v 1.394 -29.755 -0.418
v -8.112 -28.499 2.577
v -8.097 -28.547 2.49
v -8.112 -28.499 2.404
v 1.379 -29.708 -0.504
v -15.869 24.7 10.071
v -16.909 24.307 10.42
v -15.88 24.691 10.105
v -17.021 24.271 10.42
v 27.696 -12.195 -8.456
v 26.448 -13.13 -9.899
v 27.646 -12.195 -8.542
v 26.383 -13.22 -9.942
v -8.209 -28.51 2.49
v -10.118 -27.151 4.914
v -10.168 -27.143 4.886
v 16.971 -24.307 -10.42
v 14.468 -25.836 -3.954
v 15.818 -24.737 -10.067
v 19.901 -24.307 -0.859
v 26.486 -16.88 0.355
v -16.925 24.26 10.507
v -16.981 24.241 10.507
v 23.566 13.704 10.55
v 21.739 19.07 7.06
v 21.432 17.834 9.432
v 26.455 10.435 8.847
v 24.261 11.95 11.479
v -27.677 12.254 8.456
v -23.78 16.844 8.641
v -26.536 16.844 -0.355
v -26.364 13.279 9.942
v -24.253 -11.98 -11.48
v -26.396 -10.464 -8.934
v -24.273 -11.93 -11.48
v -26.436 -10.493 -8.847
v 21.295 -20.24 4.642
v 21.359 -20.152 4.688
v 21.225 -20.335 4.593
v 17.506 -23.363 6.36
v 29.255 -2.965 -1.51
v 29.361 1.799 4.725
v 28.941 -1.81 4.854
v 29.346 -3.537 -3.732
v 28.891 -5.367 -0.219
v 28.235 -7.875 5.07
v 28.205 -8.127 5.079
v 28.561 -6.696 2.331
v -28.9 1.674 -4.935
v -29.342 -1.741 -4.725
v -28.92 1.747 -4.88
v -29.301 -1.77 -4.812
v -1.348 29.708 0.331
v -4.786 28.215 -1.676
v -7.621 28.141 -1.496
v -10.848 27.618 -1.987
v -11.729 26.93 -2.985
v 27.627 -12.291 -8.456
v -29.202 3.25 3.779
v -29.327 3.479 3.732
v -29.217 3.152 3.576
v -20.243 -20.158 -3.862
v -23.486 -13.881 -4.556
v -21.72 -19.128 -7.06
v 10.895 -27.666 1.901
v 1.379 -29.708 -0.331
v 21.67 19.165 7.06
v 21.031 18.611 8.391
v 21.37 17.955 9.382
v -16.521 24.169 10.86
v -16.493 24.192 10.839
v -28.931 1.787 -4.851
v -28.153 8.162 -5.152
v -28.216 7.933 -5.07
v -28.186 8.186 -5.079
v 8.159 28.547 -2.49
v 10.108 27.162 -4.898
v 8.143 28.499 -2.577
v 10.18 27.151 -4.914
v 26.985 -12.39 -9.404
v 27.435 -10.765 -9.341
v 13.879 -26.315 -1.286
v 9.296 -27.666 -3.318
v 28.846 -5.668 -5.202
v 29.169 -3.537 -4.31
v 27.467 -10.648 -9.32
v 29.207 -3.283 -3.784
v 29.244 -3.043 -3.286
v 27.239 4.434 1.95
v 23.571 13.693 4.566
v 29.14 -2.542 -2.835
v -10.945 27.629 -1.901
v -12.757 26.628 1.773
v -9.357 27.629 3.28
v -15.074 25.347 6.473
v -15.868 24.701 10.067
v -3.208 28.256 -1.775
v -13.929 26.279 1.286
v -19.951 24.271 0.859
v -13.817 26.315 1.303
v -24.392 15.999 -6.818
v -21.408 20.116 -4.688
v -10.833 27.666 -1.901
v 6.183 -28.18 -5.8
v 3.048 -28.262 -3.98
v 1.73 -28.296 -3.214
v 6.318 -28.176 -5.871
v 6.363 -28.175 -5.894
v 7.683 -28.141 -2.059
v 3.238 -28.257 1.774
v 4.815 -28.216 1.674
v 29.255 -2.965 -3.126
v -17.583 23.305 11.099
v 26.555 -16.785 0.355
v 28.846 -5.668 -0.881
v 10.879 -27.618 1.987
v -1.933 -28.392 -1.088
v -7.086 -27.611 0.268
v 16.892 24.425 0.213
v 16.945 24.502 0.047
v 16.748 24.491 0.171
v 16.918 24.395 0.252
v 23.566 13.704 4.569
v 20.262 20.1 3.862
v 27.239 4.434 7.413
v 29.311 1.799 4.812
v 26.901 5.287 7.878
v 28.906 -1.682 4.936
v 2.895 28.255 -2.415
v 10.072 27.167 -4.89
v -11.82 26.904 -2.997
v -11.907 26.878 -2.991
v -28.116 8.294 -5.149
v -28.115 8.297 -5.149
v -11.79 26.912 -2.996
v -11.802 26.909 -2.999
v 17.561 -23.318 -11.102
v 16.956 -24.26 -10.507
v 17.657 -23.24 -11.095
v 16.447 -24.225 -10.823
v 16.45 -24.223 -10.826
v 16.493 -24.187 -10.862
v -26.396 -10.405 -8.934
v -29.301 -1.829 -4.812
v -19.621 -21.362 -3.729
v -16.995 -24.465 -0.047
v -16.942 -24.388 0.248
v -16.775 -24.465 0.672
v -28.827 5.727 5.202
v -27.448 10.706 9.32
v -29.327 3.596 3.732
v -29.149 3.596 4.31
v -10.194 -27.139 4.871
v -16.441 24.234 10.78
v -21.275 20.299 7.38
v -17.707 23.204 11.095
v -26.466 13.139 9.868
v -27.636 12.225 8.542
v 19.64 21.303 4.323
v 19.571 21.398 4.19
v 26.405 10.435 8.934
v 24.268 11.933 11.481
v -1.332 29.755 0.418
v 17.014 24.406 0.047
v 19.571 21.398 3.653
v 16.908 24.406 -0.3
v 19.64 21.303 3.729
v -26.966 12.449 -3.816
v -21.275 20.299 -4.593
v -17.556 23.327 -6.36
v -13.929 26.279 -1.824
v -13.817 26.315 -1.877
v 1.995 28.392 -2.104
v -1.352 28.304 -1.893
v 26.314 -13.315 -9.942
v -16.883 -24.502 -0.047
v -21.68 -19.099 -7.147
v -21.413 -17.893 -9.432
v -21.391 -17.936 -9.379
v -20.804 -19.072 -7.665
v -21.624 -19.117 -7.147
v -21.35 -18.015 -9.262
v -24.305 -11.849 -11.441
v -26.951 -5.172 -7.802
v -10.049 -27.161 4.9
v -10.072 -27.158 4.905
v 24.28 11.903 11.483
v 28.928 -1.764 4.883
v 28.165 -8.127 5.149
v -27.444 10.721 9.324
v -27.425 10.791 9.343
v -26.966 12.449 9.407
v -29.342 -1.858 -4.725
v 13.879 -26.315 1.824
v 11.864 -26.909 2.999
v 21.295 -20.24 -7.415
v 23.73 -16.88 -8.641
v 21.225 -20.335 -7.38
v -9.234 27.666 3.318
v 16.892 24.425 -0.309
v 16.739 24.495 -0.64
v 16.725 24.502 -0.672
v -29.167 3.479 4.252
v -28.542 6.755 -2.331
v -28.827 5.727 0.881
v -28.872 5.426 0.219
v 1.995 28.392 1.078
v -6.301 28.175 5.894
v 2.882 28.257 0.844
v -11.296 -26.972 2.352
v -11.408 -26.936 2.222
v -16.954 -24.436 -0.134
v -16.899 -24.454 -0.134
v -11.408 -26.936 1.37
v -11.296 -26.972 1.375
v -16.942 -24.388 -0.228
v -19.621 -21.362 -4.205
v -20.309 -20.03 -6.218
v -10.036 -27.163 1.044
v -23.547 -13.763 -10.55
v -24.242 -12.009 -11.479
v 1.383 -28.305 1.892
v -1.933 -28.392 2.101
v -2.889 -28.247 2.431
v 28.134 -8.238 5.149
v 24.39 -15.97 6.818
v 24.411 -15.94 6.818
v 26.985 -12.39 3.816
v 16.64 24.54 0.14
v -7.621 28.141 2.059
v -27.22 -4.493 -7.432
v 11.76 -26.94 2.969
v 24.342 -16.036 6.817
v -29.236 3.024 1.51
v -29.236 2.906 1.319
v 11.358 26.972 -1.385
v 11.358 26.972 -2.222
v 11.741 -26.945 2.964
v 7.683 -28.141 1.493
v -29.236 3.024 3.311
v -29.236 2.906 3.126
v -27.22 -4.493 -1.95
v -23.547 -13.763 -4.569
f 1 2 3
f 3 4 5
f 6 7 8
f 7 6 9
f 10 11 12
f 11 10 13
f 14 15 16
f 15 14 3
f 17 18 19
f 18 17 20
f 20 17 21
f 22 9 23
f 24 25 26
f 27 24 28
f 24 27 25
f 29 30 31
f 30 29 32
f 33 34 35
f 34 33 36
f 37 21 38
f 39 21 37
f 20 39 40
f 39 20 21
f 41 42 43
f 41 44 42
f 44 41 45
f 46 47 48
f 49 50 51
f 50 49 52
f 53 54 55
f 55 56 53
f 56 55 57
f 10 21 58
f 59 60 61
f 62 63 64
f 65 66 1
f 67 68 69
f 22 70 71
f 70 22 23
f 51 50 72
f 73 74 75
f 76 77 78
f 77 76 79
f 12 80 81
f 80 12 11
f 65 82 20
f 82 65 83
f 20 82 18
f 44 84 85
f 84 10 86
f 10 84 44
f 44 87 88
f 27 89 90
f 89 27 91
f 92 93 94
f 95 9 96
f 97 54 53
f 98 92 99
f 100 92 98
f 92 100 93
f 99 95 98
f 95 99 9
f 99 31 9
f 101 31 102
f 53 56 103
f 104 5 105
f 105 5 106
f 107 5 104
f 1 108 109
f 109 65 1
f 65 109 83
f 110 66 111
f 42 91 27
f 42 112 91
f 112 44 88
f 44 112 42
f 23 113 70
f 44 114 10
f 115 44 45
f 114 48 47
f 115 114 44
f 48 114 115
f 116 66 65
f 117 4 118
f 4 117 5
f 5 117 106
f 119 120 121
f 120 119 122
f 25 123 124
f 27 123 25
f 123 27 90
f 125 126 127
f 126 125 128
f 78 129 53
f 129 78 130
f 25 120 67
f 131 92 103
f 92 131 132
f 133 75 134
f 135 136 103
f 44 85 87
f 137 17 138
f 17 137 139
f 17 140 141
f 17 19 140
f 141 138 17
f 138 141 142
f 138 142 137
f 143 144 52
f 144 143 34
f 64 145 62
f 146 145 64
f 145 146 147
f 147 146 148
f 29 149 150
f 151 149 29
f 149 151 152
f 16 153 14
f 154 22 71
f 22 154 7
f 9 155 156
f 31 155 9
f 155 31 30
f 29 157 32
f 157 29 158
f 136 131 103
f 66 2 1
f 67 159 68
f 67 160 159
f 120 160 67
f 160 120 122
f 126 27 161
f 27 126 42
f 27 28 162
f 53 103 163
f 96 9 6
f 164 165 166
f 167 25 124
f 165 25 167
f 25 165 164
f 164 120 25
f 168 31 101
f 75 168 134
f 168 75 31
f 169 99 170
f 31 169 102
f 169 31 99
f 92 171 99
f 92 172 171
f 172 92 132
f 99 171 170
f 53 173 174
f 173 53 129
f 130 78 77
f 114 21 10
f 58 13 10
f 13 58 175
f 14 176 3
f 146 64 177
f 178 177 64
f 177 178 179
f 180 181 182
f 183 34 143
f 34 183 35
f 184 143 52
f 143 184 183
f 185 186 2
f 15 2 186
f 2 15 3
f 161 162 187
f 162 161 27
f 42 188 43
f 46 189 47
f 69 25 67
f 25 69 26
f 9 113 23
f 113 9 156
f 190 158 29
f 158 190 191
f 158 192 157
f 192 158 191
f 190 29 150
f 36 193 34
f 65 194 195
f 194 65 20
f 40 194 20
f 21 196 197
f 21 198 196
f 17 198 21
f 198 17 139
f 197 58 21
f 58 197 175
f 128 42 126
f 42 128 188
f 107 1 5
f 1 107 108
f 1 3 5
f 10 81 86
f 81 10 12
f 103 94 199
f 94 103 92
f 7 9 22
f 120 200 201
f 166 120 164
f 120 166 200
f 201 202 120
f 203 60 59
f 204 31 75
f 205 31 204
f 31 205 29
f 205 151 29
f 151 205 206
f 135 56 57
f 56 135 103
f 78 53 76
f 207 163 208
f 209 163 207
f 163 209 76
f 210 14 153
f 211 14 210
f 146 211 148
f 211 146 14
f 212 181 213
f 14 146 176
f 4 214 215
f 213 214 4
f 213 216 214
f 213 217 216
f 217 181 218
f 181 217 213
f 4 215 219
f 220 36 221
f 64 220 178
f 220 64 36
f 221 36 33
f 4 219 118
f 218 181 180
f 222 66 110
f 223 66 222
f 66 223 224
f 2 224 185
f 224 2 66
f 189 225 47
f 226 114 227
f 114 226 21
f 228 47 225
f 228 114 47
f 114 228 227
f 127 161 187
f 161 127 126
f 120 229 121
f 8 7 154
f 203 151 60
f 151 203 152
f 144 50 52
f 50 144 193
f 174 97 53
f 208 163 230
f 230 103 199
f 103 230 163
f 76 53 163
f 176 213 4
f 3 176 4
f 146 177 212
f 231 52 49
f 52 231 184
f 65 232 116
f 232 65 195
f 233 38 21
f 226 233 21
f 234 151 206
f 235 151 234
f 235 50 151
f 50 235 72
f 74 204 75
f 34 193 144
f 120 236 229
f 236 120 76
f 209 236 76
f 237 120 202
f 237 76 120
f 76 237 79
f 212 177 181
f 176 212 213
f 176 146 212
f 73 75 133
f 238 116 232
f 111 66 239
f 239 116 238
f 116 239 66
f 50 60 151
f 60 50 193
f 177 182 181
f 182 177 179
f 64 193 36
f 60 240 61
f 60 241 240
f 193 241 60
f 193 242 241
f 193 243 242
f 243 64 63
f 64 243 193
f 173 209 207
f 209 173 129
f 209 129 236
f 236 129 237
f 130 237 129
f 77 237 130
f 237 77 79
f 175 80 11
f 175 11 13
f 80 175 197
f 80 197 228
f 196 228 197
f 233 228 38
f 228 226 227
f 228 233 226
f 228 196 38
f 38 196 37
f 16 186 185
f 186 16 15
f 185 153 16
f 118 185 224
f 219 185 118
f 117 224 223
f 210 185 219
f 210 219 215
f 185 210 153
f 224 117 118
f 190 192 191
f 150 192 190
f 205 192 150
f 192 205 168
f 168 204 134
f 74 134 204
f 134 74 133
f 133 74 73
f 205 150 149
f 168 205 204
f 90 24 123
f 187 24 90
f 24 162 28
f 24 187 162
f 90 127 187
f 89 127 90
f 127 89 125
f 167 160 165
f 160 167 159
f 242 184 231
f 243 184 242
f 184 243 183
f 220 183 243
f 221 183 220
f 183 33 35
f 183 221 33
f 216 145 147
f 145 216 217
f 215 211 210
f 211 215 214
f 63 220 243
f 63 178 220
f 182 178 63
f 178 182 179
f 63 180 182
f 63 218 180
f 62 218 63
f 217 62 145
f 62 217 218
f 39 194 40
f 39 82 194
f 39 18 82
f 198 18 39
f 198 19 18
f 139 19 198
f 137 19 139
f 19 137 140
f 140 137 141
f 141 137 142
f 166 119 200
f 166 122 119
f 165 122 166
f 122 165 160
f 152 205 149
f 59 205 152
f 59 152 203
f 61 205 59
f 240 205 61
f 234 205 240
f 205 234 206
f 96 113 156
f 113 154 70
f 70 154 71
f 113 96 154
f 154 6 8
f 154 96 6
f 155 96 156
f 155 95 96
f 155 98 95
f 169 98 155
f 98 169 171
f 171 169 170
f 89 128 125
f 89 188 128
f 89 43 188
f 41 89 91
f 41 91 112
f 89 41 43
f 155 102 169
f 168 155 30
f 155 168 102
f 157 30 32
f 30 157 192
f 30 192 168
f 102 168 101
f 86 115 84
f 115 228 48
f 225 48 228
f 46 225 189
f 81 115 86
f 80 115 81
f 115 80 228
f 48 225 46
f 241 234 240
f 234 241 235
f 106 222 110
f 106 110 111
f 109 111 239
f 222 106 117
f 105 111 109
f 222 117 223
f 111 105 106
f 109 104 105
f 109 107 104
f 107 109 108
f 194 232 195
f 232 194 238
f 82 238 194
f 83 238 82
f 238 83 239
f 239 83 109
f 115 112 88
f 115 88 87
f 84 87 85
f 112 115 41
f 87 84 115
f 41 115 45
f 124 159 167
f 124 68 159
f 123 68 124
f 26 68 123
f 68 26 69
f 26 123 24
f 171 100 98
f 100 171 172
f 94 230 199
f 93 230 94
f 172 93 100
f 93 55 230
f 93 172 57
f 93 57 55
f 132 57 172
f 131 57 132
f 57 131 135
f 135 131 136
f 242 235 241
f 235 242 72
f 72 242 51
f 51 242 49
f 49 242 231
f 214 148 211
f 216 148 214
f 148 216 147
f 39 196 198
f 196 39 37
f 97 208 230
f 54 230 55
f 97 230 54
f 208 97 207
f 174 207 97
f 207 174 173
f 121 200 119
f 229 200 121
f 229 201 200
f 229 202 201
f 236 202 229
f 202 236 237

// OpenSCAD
// Auto-generated OpenSCAD file

    inner_points = 10*[[-1.6451036775652808, -2.1626836934703126, -1.1975226886664396], [1.686072709471346, 2.432955782684813, 0.2356107715886286], [-1.6860727094713472, -2.4329557826848114, -0.2356107715886286], [1.6451036775652794, 2.1626836934703144, 1.1975226886664396], [-2.6884846067758437, 1.2389917062429145, 0.233618340039301], [-2.1194517463573437, 2.0240206487946675, 0.47842676129971456], [2.119451746357343, -2.0240206487946657, -0.47842676129971456], [2.6884846067758428, -1.2389917062429128, -0.233618340039301], [-0.2907283441631142, 1.0697947112799653, -2.7547493104508978], [-0.5305652343997654, -0.5124056576130412, 2.8763811346733195], [0.5305652343997641, 0.5124056576130432, -2.8763811346733195], [0.2907283441631129, -1.0697947112799635, 2.7547493104508978], [-1.8467649995645183, -1.4227471690324143, -1.839259902027394], [1.1327297390179003, 2.68771773847334, -0.5574263668434638], [-1.95402331758078, -2.130328684806416, 0.6790581910658857], [1.0254714210016385, 1.9801362226993382, 1.9608917262498158], [-1.0254714210016398, -1.9801362226993364, -1.9608917262498158], [1.9540233175807786, 2.130328684806418, -0.6790581910658857], [-1.1327297390179016, -2.687717738473338, 0.5574263668434638], [1.846764999564517, 1.422747169032416, 1.839259902027394], [-2.87456367211222, 0.5667833051879534, -0.4829780924069351], [-1.3848163028210105, 2.6220157589408304, 0.15793867518503008], [-2.915532704018286, 0.2965112159734543, 0.47893382467087603], [-1.425785334727077, 2.351743669726331, 1.1198505922628412], [1.4257853347270757, -2.3517436697263294, -1.1198505922628412], [2.9155327040182852, -0.2965112159734523, -0.47893382467087603], [1.3848163028210092, -2.6220157589408286, -0.15793867518503008], [2.874563672112219, -0.5667833051879514, 0.4829780924069351], [-1.2523453639028133, 1.0446987882266965, -2.48150417875951], [-0.6833125034843128, 1.8297277307784492, -2.2366957574990964], [-1.4668619999353363, -0.3704642433213059, 2.5551320074270496], [-0.8978291395168357, 0.4145646992304467, 2.799940428687463], [0.8978291395168344, -0.4145646992304447, -2.799940428687463], [1.466861999935335, 0.3704642433213079, -2.5551320074270496], [0.6833125034843115, -1.8297277307784474, 2.2366957574990964], [1.252345363902812, -1.0446987882266947, 2.48150417875951], [-2.214028904681588, -0.49577681218892655, -1.9157006080132506], [0.1964329734823296, 2.829659152765075, -0.8786754940897339], [-2.3466074769019785, -1.370395665307932, 1.197111744017687], [0.06385440126193956, 1.9550402996460696, 2.2341368579412038], [-0.06385440126194084, -1.9550402996460678, -2.2341368579412038], [2.3466074769019776, 1.3703956653079339, -1.197111744017687], [-0.19643297348233088, -2.8296591527650734, 0.8786754940897339], [2.2140289046815873, 0.49577681218892855, 1.9157006080132506], [-2.606613064002787, 0.2641562073095579, -1.3976470550614495], [-0.7651840462573698, 2.8045632297118064, -0.6054303623983461], [-2.7138713820190485, -0.44342530846444383, 1.1206710380318305], [-0.8724423642736312, 2.096981713937805, 1.9128877306949337], [0.8724423642736299, -2.096981713937803, -1.9128877306949337], [2.7138713820190477, 0.44342530846444583, -1.1206710380318305], [0.7651840462573685, -2.8045632297118046, 0.6054303623983461], [2.606613064002786, -0.2641562073095559, 1.3976470550614495], [-1.9869808074391464, 0.4467036780805339, -2.161016092644826], [-0.4972334381479373, 2.5019361318334106, -1.5200993250528605], [-2.1605284115656027, -0.6981872642529703, 1.913708176463923], [-0.6707810422743935, 1.3570451894999065, 2.554624944055888], [0.6707810422743922, -1.3570451894999047, -2.554624944055888], [2.160528411565602, 0.6981872642529723, -1.913708176463923], [0.49723343814793597, -2.501936131833409, 1.5200993250528605], [1.986980807439145, -0.4467036780805319, 2.161016092644826], [-1.5501088369047502, -1.3487833733431578, 2.36549645177391], [0.22122791204797956, 2.2506578071333787, -2.1686920260683786], [-0.22122791204798084, -2.250657807133377, 2.1686920260683786], [1.5501088369047489, 1.3487833733431596, -2.36549645177391], [-1.7361879022411257, -2.020991774398119, 1.648900019327674], [0.914894323678246, 2.578380828065043, -1.5272681951052522], [-0.9148943236782473, -2.578380828065041, 1.5272681951052522], [1.7361879022411244, 2.0209917743981207, -1.648900019327674], [-0.6138120713691793, -1.490724787634893, 2.6867455790201804], [0.6138120713691779, 1.4907247876348948, -2.6867455790201804]];

    outer_points = 10*[[-0.8127781095257554, -2.8451711072731785, 0.24903929976162134], [-0.13633829193286426, 2.9660232971458376, 0.04177473821664251], [0.13633829193286426, -2.9660232971458376, -0.04177473821664251], [0.8127781095257554, 2.8451711072731785, -0.24903929976162134], [0.7997377853601801, -0.49633525670734463, 2.816327084240848], [0.9152875010113133, 0.49633525670734463, 2.7809220703309587], [-0.9152875010113133, -0.49633525670734463, -2.7809220703309587], [-0.7997377853601801, 0.49633525670734463, -2.816327084240848], [-2.631631449063583, 0.3537405211795562, 1.329289666621699], [2.9245927429151473, -0.3537405211795562, -0.37316536491986596], [-2.9245927429151473, 0.3537405211795562, 0.37316536491986596], [2.631631449063583, -0.3537405211795562, -1.329289666621699], [-1.3984419351885988, -2.440647573398727, 0.9514341985555175], [-0.7934157692584937, 2.757042714100203, 0.7660511389790129], [1.0863770631100578, -2.757042714100203, 0.19007316272281993], [1.6914032290401628, 2.440647573398727, 0.00469010314631535], [-1.6914032290401628, -2.440647573398727, -0.00469010314631535], [-1.0863770631100578, 2.757042714100203, -0.19007316272281993], [0.7934157692584937, -2.757042714100203, -0.7660511389790129], [1.3984419351885988, 2.440647573398727, -0.9514341985555175], [0.14116788247970447, -1.2389964769384032, 2.6949187032084154], [0.443680965444757, 1.3598486668110619, 2.602227173420163], [1.090284283938324, -1.3598486668110619, 2.4041046652301516], [1.3927973669033766, 1.2389964769384032, 2.3114131354418994], [-1.3927973669033766, -1.2389964769384032, -2.3114131354418994], [-1.090284283938324, 1.3598486668110619, -2.4041046652301516], [-0.443680965444757, -1.3598486668110619, -2.602227173420163], [-0.14116788247970447, 1.2389964769384032, -2.6949187032084154], [-2.159102543778453, -0.17994011600586796, 2.030646502450221], [-2.0435528281273196, 0.8127303974088214, 1.9952414885403318], [2.8105354528188604, -0.8127303974088214, 0.5079244307848257], [2.9260851684699936, 0.17994011600586796, 0.4725194168749366], [-2.9260851684699936, -0.17994011600586796, -0.4725194168749366], [-2.8105354528188604, 0.8127303974088214, -0.5079244307848257], [2.0435528281273196, -0.8127303974088214, -1.9952414885403318], [2.159102543778453, 0.17994011600586796, -2.030646502450221], [-1.3969495096337523, -1.9069669362133024, 1.7971189803503202], [-0.9074730593547807, 2.298052837870938, 1.6471409346837047], [1.6744556840463214, -2.298052837870938, 0.8560249846414527], [2.163932134325293, 1.9069669362133024, 0.7060469389748373], [-2.163932134325293, -1.9069669362133024, -0.7060469389748373], [-1.6744556840463214, 2.298052837870938, -0.8560249846414527], [0.9074730593547807, -2.298052837870938, -1.6471409346837047], [1.3969495096337523, 1.9069669362133024, -1.7971189803503202], [-0.8088708886974889, -1.4479770599840374, 2.4630708022689527], [-0.4349441540696506, 1.764372200685514, 2.3484977705122265], [1.6759481096011677, -1.764372200685514, 1.7017097664362553], [2.049874844229006, 1.4479770599840374, 1.5871367346795289], [-2.049874844229006, -1.4479770599840374, -1.5871367346795289], [-1.6759481096011677, 1.764372200685514, -1.7017097664362553], [0.4349441540696506, -1.764372200685514, -2.3484977705122265], [0.8088708886974889, 1.4479770599840374, -2.4630708022689527], [-1.6874960082118968, -1.0434535261095852, 2.2093413993610165], [-1.384982925246844, 1.5553916176398799, 2.116649869572764], [2.3330255869267966, -1.5553916176398799, 0.9774333656738852], [2.6355386698918495, 1.0434535261095852, 0.8847418358856328], [-2.6355386698918495, -1.0434535261095852, -0.8847418358856328], [-2.3330255869267966, 1.5553916176398799, -0.9774333656738852], [1.384982925246844, -1.5553916176398799, -2.116649869572764], [1.6874960082118968, 1.0434535261095852, -2.2093413993610165], [2.645537886674456, -1.6785392291321632, 0.03553595709364332], [-2.17151655583448, 1.6785392291321632, 1.5115056605296813], [2.17151655583448, -1.6785392291321632, -1.5115056605296813], [-2.645537886674456, 1.6785392291321632, -0.03553595709364332], [1.9869679837939802, -2.4212004493632215, -0.08587242393878891], [-1.6940066899424162, 2.4212004493632215, 1.0419967256406217], [1.6940066899424162, -2.4212004493632215, -1.0419967256406217], [-1.9869679837939802, 2.4212004493632215, 0.08587242393878891], [2.759595176770743, -1.219549352902898, -0.8455538386110483], [-2.759595176770743, 1.219549352902898, 0.8455538386110483]];

    // Convex hull for inner set (I)
    module inner_hull() {
        hull() {
            for (p = inner_points) {
                translate(p) sphere(r=0.1);
            }
        }
    }

    // Convex hull for outer set (O) minus inner hull (O \ I)
    module outer_minus_inner() {
        difference() {
            hull() {
                for (p = outer_points) {
                    translate(p) sphere(r=0.1);
                }
            }
            inner_hull(); // Subtract inner hull
        }
    }

    // Convex hull for outer set (O) minus all translated inner hulls
    module outer_minus_AllTranslationInner() {
        difference() {
            hull() {
                for (p = outer_points) {
                    translate(p) sphere(r=0.1);
                }
            }
            hull() {
                translate([0,0,50]) inner_hull();
                translate([0,0,-50]) inner_hull();
            }; // Subtract translated inner hulls
        }
    }

    // Difference between outer_minus_inner and outer_minus_AllTranslationInner
    module outer_minus_inner_diff() {
        difference() {
            // Outer minus inner
            difference() {
                hull() {
                    for (p = outer_points) {
                        translate(p) sphere(r=0.1);
                    }
                }
                inner_hull();
            }

            // Subtract Outer minus AllTranslationInner
            difference() {
                hull() {
                    for (p = outer_points) {
                        translate(p) sphere(r=0.1);
                    }
                }
                hull() {
                    translate([0,0,50]) inner_hull();
                    translate([0,0,-50]) inner_hull();
                };
            }
        }
    }

    // Rendering all with colors applied
    color([0, 1, 0, 1]) outer_minus_AllTranslationInner(); // Opaque green
    
